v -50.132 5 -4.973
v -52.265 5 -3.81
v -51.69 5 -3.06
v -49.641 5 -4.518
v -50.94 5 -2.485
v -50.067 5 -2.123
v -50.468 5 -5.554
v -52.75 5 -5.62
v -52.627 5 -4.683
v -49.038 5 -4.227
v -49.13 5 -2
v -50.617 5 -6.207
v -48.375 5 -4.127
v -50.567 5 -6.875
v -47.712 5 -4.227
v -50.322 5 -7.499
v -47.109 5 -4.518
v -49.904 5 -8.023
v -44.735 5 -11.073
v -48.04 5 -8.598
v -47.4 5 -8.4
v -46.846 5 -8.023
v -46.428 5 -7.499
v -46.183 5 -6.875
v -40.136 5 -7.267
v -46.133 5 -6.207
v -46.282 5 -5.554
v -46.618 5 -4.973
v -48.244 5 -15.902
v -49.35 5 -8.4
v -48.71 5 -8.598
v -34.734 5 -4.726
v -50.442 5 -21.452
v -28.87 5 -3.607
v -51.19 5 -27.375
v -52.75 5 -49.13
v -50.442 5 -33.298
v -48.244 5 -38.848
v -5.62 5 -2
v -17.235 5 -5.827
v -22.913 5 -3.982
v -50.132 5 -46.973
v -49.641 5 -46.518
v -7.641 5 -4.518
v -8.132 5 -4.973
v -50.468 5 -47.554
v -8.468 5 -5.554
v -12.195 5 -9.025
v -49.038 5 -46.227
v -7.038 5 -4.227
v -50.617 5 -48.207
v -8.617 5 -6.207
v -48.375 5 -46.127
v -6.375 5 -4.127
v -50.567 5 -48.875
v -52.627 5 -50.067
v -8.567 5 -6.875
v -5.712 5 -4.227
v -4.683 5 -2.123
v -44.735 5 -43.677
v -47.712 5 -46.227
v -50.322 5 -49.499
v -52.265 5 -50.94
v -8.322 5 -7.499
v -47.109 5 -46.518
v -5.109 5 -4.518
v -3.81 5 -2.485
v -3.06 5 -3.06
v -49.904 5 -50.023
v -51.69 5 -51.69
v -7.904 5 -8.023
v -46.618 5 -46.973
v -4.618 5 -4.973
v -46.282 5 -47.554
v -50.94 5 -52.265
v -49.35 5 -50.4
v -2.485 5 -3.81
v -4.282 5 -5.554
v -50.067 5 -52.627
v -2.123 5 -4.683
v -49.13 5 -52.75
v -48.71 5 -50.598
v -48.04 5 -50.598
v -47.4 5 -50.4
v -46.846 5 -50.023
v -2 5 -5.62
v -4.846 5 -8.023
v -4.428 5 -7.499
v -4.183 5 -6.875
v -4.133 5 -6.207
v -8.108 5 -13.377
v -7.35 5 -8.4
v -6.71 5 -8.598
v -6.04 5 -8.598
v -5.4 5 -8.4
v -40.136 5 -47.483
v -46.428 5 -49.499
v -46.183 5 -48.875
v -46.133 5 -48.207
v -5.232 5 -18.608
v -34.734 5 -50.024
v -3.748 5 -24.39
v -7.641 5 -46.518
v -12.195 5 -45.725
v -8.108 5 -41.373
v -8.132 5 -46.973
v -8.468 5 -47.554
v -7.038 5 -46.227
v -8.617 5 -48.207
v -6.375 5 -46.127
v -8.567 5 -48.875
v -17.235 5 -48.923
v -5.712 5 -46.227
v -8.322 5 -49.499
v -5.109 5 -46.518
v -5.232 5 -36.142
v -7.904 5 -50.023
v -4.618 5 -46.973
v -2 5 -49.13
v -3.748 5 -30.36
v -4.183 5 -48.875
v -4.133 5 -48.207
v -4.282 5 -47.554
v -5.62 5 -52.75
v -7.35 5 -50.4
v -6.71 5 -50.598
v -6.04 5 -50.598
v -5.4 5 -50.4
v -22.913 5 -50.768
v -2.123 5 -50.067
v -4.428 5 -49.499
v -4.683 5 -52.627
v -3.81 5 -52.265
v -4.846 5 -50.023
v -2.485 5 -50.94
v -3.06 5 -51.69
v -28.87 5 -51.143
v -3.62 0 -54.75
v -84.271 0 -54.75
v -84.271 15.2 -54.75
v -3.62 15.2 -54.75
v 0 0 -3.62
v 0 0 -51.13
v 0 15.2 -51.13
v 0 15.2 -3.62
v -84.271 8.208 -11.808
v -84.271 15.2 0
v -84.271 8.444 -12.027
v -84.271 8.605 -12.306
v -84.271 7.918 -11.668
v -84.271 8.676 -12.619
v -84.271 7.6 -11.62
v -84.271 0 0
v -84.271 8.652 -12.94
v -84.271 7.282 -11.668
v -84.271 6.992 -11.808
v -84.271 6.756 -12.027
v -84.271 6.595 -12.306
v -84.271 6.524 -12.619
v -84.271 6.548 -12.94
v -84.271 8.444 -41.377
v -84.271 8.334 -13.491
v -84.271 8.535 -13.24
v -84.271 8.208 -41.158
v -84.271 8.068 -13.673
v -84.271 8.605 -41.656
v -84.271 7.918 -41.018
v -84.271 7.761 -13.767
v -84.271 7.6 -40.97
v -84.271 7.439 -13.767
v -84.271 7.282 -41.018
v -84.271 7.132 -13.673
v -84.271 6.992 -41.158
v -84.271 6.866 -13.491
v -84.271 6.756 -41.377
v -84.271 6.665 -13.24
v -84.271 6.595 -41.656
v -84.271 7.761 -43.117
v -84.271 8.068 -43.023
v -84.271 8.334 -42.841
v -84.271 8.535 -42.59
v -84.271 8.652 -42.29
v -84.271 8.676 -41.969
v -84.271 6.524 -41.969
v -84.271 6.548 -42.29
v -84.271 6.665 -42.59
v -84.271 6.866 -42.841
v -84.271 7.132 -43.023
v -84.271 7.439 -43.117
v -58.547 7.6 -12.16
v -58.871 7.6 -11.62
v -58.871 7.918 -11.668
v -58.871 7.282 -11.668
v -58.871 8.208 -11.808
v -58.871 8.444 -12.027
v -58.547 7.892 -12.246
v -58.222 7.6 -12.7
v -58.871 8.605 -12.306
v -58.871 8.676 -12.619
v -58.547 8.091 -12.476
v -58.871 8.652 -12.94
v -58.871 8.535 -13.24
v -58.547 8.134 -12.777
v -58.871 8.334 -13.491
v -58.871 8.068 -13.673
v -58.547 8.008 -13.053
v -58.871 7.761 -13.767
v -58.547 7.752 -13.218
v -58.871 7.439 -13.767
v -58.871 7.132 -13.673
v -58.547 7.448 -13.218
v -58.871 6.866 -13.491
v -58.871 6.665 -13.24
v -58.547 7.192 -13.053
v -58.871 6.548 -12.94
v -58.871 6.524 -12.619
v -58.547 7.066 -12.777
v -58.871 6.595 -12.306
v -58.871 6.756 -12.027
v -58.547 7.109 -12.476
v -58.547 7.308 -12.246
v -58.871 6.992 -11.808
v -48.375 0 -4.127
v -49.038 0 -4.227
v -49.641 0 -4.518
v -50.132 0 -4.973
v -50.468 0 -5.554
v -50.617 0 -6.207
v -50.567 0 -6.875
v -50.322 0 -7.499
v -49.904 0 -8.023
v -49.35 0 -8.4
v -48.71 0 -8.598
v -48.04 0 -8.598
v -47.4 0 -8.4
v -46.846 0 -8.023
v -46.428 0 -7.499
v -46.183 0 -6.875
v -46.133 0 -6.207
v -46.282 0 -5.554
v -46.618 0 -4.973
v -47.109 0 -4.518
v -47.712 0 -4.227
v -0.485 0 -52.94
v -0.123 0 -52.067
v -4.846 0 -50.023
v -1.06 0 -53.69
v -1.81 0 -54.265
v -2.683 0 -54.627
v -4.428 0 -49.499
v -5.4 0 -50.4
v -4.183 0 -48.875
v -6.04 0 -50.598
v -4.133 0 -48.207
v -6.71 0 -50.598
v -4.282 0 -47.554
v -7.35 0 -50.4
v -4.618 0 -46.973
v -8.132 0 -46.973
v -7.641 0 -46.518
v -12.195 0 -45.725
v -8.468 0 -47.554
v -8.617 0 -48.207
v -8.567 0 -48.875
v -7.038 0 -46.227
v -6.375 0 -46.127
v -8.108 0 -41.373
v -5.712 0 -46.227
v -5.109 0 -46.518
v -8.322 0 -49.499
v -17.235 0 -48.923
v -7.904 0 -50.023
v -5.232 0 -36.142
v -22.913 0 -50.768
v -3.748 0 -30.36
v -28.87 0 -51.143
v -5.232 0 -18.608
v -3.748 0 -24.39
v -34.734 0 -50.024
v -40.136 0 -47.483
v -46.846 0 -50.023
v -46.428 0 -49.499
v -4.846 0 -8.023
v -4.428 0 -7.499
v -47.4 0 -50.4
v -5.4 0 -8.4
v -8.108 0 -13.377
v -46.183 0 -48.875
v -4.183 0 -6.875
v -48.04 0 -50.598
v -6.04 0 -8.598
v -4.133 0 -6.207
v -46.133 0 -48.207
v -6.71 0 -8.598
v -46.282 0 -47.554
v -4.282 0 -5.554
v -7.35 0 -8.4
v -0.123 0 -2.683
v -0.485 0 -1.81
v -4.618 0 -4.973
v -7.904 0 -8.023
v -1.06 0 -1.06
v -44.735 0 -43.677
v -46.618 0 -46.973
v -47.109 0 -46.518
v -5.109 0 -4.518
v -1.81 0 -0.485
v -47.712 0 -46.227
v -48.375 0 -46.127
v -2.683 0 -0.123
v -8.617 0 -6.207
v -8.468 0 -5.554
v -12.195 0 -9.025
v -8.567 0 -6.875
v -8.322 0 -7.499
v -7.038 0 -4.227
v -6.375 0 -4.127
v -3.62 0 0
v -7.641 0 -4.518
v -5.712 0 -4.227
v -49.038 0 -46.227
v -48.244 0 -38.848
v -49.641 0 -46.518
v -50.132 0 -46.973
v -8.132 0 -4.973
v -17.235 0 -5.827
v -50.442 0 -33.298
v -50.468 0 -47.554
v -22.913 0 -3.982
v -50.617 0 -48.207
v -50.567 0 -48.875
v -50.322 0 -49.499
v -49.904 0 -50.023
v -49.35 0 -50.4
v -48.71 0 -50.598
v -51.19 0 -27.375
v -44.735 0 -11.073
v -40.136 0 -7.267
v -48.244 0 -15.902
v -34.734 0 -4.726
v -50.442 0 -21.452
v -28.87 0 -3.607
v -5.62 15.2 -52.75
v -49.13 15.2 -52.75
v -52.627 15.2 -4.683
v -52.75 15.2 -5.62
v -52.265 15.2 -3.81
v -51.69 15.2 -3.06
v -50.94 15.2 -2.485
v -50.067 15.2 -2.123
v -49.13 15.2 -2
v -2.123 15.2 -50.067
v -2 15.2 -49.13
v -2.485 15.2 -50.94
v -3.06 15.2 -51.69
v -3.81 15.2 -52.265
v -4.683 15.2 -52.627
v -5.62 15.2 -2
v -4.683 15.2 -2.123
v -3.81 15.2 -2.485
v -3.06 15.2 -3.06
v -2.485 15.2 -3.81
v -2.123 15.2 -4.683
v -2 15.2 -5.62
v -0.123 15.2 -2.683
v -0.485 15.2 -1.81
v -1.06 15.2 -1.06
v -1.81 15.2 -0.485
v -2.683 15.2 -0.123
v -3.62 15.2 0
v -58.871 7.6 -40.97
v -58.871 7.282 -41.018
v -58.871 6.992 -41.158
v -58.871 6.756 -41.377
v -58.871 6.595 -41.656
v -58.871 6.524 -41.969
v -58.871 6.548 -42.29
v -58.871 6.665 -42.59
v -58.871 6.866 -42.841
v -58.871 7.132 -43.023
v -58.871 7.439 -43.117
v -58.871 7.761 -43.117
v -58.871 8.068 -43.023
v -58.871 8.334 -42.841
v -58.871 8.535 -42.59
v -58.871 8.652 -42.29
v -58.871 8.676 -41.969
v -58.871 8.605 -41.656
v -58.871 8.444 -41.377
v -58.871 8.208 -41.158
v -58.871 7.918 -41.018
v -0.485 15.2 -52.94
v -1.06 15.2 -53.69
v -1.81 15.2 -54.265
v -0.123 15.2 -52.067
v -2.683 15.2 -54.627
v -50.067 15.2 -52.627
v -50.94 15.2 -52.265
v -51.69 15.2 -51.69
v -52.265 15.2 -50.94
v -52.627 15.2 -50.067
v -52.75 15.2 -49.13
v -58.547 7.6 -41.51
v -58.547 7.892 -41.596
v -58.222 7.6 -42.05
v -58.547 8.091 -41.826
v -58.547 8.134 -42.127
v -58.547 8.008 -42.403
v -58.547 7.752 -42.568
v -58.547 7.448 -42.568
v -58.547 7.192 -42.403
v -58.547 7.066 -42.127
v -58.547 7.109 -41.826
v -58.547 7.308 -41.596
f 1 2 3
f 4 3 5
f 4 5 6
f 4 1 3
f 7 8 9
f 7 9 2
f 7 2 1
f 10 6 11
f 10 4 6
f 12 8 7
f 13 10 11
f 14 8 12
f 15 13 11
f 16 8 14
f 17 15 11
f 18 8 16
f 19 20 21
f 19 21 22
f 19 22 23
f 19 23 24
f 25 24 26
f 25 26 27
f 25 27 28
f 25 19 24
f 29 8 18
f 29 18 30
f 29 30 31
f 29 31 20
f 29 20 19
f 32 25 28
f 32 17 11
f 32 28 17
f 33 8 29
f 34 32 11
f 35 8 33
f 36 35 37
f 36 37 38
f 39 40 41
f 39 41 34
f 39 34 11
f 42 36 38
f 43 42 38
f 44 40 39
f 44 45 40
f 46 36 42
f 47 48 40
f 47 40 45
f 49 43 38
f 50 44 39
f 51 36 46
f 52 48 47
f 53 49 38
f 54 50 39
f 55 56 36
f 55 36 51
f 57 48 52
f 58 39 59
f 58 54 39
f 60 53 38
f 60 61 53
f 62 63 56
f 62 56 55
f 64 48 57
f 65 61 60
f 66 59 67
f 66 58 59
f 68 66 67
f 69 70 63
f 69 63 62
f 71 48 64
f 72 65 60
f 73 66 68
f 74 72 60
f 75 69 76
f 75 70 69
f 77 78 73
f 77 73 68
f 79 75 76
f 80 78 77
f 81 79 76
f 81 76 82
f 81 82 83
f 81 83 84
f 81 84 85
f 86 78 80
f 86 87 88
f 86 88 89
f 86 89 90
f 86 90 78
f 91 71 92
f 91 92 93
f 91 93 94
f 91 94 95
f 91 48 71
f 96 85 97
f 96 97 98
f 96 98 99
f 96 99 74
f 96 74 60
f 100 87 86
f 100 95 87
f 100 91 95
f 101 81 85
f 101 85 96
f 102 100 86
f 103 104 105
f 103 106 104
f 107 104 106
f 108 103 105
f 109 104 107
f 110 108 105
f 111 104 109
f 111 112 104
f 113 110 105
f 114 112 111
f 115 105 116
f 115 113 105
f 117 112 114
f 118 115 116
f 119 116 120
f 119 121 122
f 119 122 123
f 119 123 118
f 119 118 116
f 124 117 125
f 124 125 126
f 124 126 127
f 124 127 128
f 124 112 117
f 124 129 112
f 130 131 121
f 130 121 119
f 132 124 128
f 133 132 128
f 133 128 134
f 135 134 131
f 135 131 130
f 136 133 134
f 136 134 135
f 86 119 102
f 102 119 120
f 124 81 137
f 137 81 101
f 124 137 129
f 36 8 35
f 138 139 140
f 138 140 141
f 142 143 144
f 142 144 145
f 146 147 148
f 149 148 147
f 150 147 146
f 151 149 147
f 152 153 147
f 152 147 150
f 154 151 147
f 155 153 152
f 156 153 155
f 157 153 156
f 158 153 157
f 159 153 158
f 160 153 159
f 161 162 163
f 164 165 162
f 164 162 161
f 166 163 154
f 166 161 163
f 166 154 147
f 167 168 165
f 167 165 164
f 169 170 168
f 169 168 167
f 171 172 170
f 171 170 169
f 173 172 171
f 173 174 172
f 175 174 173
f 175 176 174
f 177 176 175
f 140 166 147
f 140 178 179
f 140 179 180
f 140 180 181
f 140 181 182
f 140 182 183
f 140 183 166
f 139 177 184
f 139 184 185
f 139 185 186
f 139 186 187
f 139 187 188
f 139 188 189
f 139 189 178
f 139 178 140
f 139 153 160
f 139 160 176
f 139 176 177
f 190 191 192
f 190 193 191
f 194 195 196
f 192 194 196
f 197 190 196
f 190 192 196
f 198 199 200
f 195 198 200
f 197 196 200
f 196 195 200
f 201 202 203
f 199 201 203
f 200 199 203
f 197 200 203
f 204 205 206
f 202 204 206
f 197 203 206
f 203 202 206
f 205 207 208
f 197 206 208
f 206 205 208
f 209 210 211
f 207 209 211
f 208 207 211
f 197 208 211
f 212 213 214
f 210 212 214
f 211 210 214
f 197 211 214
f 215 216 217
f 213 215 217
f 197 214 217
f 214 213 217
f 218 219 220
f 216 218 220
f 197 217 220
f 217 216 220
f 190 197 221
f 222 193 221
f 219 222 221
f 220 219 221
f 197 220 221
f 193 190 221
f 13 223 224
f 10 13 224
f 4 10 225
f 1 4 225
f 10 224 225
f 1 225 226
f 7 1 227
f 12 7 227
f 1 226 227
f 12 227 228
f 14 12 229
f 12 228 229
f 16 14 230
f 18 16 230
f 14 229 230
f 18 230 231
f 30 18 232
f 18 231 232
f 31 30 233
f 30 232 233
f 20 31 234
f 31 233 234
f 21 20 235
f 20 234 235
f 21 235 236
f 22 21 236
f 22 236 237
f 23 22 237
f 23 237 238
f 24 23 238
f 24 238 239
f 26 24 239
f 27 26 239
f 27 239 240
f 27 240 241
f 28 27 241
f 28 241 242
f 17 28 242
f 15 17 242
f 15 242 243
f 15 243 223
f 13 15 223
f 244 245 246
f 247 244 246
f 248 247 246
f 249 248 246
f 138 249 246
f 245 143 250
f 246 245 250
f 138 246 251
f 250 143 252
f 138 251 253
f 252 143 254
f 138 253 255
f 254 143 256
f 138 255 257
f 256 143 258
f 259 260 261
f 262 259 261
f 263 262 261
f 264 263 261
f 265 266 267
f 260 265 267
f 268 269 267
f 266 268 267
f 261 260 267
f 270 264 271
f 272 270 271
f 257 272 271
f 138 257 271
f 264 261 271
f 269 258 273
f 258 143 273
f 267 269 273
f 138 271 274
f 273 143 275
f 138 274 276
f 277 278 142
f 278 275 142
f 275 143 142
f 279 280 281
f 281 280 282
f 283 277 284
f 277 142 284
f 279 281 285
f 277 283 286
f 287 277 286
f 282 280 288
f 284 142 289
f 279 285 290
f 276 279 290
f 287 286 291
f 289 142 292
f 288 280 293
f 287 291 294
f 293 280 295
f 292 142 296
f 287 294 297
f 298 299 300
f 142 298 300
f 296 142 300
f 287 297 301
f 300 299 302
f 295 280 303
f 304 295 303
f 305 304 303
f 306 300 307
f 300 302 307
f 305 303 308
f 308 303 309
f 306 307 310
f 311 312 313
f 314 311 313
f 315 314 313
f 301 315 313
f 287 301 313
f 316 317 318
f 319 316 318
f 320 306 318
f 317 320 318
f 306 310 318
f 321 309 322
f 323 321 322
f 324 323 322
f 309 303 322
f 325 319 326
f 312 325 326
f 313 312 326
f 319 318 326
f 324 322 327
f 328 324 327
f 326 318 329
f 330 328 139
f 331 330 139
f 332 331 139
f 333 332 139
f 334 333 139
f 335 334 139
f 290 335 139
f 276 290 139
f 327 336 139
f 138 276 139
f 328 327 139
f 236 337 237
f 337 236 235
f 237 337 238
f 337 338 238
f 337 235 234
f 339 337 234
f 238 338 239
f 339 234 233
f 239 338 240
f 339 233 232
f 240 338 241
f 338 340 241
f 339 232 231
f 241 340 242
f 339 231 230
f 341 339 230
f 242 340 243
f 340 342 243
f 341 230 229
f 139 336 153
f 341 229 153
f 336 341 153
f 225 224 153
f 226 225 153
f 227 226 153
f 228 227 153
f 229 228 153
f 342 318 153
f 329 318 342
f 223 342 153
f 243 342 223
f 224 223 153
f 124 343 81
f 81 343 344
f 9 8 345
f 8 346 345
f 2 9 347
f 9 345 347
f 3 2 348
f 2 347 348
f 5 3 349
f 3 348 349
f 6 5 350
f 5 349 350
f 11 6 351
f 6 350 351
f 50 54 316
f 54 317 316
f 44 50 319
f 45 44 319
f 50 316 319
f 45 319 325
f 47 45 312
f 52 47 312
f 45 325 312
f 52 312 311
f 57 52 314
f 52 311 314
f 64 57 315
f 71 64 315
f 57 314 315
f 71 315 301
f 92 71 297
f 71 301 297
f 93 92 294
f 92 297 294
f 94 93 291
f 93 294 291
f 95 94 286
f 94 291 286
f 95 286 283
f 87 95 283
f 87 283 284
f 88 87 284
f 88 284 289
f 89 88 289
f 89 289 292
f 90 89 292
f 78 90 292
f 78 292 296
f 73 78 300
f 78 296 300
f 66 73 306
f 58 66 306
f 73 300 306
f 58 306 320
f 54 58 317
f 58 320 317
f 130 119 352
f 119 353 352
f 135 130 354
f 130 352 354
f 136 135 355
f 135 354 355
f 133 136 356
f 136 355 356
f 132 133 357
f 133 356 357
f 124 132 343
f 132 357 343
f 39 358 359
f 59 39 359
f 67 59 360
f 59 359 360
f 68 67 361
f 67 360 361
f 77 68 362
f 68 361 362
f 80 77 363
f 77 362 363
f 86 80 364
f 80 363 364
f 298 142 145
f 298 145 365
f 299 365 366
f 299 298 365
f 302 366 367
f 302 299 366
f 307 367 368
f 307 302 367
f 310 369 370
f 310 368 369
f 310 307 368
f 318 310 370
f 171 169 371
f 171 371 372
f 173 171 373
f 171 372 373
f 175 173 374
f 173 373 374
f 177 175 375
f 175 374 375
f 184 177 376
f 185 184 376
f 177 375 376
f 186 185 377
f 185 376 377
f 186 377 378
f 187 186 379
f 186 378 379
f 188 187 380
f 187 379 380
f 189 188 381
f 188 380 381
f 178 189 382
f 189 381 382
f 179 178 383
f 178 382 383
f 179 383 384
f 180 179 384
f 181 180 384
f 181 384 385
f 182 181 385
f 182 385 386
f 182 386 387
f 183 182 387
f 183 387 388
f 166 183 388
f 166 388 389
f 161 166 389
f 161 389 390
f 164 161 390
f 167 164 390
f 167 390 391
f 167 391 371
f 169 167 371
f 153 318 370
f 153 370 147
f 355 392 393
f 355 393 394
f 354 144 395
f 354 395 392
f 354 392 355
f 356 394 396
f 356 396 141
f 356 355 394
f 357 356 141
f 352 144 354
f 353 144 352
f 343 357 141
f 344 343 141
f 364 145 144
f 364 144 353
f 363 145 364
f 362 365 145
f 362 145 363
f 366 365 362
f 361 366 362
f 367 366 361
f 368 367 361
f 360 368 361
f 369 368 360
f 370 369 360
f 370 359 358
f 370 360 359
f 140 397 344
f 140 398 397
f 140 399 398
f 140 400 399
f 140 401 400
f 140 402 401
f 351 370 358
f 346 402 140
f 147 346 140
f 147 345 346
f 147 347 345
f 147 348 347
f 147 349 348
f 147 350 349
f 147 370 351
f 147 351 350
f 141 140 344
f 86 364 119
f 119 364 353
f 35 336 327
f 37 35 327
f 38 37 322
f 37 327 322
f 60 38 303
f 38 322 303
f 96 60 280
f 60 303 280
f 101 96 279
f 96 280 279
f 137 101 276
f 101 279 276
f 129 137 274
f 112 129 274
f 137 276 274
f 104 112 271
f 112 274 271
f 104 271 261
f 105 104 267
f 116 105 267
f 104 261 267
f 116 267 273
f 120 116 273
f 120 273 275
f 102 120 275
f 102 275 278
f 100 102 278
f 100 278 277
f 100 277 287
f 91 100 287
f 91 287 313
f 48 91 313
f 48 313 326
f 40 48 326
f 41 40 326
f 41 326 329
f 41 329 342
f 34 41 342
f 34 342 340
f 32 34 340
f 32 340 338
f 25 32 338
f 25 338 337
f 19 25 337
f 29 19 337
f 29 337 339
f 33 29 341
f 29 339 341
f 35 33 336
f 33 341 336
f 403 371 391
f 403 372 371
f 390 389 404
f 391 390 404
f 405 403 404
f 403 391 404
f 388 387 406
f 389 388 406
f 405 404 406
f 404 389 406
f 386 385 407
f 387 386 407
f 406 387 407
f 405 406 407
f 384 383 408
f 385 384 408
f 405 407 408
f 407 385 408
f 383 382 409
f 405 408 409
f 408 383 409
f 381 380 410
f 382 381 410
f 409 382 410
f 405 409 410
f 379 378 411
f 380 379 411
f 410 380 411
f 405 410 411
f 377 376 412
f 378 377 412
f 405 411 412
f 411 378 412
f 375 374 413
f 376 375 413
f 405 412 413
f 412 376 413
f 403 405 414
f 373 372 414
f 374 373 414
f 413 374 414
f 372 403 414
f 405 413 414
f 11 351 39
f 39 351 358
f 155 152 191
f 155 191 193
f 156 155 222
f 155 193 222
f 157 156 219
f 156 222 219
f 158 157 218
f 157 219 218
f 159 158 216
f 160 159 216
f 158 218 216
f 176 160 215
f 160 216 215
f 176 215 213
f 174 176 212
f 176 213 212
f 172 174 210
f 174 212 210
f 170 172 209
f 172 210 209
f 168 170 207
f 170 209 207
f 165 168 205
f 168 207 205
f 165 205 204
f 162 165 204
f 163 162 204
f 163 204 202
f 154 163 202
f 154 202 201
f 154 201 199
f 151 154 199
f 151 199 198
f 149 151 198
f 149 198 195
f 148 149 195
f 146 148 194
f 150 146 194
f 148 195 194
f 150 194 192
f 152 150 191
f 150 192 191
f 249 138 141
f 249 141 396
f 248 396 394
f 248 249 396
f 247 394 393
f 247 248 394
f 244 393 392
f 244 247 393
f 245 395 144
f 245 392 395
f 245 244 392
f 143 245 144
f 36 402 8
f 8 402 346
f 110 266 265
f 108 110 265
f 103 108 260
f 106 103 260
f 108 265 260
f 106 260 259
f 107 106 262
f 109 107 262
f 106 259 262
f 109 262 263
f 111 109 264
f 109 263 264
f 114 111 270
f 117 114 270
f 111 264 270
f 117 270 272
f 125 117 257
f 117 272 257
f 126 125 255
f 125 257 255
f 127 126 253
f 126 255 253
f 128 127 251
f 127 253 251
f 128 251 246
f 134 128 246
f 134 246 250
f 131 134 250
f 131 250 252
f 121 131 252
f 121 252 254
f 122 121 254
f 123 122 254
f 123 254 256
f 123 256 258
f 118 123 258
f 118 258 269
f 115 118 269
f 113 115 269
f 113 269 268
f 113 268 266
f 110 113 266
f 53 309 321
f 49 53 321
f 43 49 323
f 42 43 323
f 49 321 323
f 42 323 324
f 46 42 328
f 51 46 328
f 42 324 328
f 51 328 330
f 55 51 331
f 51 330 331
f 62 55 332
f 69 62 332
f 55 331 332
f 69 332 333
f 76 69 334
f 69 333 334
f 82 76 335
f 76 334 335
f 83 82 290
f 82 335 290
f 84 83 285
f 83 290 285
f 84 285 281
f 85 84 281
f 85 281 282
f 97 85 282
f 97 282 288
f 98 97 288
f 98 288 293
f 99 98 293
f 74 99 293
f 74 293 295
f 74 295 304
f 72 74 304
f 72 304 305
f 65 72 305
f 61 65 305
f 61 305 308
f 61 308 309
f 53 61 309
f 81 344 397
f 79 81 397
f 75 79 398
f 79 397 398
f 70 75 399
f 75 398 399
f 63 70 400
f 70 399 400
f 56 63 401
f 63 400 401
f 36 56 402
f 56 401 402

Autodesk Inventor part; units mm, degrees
ref_plane "YZ Plane" through (0, 0, 0) normal (1, 0, 0) x (0, 1, 0)
ref_plane "XZ Plane" through (0, 0, 0) normal (0, 1, 0) x (-1, 0, 0)
ref_plane "XY Plane" through (0, 0, 0) normal (0, 0, 1) x (1, 0, 0)
sketch "Sketch1" plane through (0, 0, 0) normal (0, 1, 0) x (-1, 0, 0)
  line L0 (3.62, 0) -> (84.271, 0)
  line L1 (84.271, 0) -> (84.271, -54.75)
  line L2 (84.271, -54.75) -> (3.62, -54.75)
  line L3 (0, -51.13) -> (0, -3.62)
  circle A0 centre (27.375, -27.375) radius 23.815
  line L4 (0, -27.375) -> (27.375, -27.375) construction
  line L5 (27.375, -27.375) -> (27.375, 0) construction
  arc A1 (0, -51.13) -> (3.62, -54.75) centre (3.62, -51.13) ccw
  arc A2 (3.62, 0) -> (0, -3.62) centre (3.62, -3.62) ccw
  point P0 (0, 0)
  point P1 (0, -54.75)
  dimension "d0" = 54.75
  dimension "d1" = 84.271
  dimension "d2" = 47.63
  dimension "d3" = 3.62
extrude "Extrusion1" add sketch "Sketch1" along normal blind 15.2
sketch "Sketch2" plane through (0, 15.2, 0) normal (0, 1, 0) x (1, 0, 0)
  line L0 (-49.13, 2) -> (-5.62, 2)
  line L1 (-2, 5.62) -> (-2, 49.13)
  line L2 (-5.62, 52.75) -> (-49.13, 52.75)
  line L3 (-52.75, 49.13) -> (-52.75, 5.62)
  circle A0 centre (-27.375, 27.375) radius 23.815 construction
  line L4 (-52.75, 27.375) -> (-2, 27.375) construction
  arc A1 (-52.75, 5.62) -> (-49.13, 2) centre (-49.13, 5.62) ccw
  arc A2 (-49.13, 52.75) -> (-52.75, 49.13) centre (-49.13, 49.13) ccw
  arc A3 (-2, 49.13) -> (-5.62, 52.75) centre (-5.62, 49.13) ccw
  arc A4 (-5.62, 2) -> (-2, 5.62) centre (-5.62, 5.62) ccw
  point P0 (0, 0)
  point P1 (-52.75, 2)
  point P2 (-52.75, 52.75)
  dimension "d6" = 50.75
  dimension "d7" = 3.62
extrude "Extrusion2" cut sketch "Sketch2" against normal blind 10.2
sketch "Sketch3" plane through (0, 5, 0) normal (0, 1, 0) x (1, 0, 0)
  line L0 (-48.375, 6.375) -> (-6.375, 6.375) construction
  line L1 (-6.375, 6.375) -> (-6.375, 48.375) construction
  line L2 (-6.375, 48.375) -> (-48.375, 48.375) construction
  line L3 (-48.375, 48.375) -> (-48.375, 6.375) construction
  line L4 (-48.375, 27.375) -> (-6.375, 27.375) construction
  circle A0 centre (-27.375, 27.375) radius 23.815 construction
  point P0 (0, 0)
  dimension "d10" = 42
hole "Hole1" at (-48.375, 5, -6.375) at (-48.375, 5, -48.375) at (-6.375, 5, -48.375) at (-6.375, 5, -6.375) direction (0, -1, 0) diameter 4.4958 end through all clearance for "Socket Head Cap Screw" size "M4" standard "Ansi Metric M Profile"
sketch "Sketch4" plane through (-84.271, 0, -54.75) normal (-1, 0, 0) x (0, 0, 1)
  line L0 (0, 0) -> (54.75, 0) construction
  line L1 (54.75, 0) -> (54.75, 15.2) construction
  line L2 (0, 15.2) -> (54.75, 15.2) construction
  line L3 (0, 0) -> (0, 15.2) construction
  line L4 (12.7, 7.6) -> (42.05, 7.6) construction
  line L5 (51.13, 15.2) -> (3.62, 15.2) construction
  line L6 (27.375, 15.2) -> (27.375, 0) construction
  line L7 (51.19, 0) -> (3.56, 0) construction
  point P0 (27.375, 7.6)
  dimension "d18" = 12.7
  dimension "Bracket_Hole_Spacing" = 29.35
hole "Hole2" at (-84.271, 7.6, -42.05) at (-84.271, 7.6, -12.7) direction (1, 0, 0) diameter 2.159 depth 25.4 tip angle 118
equation "\"d1\" = Compressor_Center_Offset + 0.5 * d0"
equation "\"d2\" = Fan_ID"
equation "\"d3\" = Fan_Corner_Radius"
equation "\"d7\" = Fan_Corner_Radius"
equation "\"d8\" = Fan_Thickness"
equation "\"d10\" = Fan_Hole_Spacing"
equation "\"Compressor_Center_Offset\" = 56.896"
equation "\"Fan_ID\" = 47.63"
equation "\"Fan_Corner_Radius\" = 3.62"
equation "\"Fan_Thickness\" = 10.2"
equation "\"Fan_Hole_Spacing\" = 42"
properties part number "Fan_Bracket" material "ABS Plastic"
